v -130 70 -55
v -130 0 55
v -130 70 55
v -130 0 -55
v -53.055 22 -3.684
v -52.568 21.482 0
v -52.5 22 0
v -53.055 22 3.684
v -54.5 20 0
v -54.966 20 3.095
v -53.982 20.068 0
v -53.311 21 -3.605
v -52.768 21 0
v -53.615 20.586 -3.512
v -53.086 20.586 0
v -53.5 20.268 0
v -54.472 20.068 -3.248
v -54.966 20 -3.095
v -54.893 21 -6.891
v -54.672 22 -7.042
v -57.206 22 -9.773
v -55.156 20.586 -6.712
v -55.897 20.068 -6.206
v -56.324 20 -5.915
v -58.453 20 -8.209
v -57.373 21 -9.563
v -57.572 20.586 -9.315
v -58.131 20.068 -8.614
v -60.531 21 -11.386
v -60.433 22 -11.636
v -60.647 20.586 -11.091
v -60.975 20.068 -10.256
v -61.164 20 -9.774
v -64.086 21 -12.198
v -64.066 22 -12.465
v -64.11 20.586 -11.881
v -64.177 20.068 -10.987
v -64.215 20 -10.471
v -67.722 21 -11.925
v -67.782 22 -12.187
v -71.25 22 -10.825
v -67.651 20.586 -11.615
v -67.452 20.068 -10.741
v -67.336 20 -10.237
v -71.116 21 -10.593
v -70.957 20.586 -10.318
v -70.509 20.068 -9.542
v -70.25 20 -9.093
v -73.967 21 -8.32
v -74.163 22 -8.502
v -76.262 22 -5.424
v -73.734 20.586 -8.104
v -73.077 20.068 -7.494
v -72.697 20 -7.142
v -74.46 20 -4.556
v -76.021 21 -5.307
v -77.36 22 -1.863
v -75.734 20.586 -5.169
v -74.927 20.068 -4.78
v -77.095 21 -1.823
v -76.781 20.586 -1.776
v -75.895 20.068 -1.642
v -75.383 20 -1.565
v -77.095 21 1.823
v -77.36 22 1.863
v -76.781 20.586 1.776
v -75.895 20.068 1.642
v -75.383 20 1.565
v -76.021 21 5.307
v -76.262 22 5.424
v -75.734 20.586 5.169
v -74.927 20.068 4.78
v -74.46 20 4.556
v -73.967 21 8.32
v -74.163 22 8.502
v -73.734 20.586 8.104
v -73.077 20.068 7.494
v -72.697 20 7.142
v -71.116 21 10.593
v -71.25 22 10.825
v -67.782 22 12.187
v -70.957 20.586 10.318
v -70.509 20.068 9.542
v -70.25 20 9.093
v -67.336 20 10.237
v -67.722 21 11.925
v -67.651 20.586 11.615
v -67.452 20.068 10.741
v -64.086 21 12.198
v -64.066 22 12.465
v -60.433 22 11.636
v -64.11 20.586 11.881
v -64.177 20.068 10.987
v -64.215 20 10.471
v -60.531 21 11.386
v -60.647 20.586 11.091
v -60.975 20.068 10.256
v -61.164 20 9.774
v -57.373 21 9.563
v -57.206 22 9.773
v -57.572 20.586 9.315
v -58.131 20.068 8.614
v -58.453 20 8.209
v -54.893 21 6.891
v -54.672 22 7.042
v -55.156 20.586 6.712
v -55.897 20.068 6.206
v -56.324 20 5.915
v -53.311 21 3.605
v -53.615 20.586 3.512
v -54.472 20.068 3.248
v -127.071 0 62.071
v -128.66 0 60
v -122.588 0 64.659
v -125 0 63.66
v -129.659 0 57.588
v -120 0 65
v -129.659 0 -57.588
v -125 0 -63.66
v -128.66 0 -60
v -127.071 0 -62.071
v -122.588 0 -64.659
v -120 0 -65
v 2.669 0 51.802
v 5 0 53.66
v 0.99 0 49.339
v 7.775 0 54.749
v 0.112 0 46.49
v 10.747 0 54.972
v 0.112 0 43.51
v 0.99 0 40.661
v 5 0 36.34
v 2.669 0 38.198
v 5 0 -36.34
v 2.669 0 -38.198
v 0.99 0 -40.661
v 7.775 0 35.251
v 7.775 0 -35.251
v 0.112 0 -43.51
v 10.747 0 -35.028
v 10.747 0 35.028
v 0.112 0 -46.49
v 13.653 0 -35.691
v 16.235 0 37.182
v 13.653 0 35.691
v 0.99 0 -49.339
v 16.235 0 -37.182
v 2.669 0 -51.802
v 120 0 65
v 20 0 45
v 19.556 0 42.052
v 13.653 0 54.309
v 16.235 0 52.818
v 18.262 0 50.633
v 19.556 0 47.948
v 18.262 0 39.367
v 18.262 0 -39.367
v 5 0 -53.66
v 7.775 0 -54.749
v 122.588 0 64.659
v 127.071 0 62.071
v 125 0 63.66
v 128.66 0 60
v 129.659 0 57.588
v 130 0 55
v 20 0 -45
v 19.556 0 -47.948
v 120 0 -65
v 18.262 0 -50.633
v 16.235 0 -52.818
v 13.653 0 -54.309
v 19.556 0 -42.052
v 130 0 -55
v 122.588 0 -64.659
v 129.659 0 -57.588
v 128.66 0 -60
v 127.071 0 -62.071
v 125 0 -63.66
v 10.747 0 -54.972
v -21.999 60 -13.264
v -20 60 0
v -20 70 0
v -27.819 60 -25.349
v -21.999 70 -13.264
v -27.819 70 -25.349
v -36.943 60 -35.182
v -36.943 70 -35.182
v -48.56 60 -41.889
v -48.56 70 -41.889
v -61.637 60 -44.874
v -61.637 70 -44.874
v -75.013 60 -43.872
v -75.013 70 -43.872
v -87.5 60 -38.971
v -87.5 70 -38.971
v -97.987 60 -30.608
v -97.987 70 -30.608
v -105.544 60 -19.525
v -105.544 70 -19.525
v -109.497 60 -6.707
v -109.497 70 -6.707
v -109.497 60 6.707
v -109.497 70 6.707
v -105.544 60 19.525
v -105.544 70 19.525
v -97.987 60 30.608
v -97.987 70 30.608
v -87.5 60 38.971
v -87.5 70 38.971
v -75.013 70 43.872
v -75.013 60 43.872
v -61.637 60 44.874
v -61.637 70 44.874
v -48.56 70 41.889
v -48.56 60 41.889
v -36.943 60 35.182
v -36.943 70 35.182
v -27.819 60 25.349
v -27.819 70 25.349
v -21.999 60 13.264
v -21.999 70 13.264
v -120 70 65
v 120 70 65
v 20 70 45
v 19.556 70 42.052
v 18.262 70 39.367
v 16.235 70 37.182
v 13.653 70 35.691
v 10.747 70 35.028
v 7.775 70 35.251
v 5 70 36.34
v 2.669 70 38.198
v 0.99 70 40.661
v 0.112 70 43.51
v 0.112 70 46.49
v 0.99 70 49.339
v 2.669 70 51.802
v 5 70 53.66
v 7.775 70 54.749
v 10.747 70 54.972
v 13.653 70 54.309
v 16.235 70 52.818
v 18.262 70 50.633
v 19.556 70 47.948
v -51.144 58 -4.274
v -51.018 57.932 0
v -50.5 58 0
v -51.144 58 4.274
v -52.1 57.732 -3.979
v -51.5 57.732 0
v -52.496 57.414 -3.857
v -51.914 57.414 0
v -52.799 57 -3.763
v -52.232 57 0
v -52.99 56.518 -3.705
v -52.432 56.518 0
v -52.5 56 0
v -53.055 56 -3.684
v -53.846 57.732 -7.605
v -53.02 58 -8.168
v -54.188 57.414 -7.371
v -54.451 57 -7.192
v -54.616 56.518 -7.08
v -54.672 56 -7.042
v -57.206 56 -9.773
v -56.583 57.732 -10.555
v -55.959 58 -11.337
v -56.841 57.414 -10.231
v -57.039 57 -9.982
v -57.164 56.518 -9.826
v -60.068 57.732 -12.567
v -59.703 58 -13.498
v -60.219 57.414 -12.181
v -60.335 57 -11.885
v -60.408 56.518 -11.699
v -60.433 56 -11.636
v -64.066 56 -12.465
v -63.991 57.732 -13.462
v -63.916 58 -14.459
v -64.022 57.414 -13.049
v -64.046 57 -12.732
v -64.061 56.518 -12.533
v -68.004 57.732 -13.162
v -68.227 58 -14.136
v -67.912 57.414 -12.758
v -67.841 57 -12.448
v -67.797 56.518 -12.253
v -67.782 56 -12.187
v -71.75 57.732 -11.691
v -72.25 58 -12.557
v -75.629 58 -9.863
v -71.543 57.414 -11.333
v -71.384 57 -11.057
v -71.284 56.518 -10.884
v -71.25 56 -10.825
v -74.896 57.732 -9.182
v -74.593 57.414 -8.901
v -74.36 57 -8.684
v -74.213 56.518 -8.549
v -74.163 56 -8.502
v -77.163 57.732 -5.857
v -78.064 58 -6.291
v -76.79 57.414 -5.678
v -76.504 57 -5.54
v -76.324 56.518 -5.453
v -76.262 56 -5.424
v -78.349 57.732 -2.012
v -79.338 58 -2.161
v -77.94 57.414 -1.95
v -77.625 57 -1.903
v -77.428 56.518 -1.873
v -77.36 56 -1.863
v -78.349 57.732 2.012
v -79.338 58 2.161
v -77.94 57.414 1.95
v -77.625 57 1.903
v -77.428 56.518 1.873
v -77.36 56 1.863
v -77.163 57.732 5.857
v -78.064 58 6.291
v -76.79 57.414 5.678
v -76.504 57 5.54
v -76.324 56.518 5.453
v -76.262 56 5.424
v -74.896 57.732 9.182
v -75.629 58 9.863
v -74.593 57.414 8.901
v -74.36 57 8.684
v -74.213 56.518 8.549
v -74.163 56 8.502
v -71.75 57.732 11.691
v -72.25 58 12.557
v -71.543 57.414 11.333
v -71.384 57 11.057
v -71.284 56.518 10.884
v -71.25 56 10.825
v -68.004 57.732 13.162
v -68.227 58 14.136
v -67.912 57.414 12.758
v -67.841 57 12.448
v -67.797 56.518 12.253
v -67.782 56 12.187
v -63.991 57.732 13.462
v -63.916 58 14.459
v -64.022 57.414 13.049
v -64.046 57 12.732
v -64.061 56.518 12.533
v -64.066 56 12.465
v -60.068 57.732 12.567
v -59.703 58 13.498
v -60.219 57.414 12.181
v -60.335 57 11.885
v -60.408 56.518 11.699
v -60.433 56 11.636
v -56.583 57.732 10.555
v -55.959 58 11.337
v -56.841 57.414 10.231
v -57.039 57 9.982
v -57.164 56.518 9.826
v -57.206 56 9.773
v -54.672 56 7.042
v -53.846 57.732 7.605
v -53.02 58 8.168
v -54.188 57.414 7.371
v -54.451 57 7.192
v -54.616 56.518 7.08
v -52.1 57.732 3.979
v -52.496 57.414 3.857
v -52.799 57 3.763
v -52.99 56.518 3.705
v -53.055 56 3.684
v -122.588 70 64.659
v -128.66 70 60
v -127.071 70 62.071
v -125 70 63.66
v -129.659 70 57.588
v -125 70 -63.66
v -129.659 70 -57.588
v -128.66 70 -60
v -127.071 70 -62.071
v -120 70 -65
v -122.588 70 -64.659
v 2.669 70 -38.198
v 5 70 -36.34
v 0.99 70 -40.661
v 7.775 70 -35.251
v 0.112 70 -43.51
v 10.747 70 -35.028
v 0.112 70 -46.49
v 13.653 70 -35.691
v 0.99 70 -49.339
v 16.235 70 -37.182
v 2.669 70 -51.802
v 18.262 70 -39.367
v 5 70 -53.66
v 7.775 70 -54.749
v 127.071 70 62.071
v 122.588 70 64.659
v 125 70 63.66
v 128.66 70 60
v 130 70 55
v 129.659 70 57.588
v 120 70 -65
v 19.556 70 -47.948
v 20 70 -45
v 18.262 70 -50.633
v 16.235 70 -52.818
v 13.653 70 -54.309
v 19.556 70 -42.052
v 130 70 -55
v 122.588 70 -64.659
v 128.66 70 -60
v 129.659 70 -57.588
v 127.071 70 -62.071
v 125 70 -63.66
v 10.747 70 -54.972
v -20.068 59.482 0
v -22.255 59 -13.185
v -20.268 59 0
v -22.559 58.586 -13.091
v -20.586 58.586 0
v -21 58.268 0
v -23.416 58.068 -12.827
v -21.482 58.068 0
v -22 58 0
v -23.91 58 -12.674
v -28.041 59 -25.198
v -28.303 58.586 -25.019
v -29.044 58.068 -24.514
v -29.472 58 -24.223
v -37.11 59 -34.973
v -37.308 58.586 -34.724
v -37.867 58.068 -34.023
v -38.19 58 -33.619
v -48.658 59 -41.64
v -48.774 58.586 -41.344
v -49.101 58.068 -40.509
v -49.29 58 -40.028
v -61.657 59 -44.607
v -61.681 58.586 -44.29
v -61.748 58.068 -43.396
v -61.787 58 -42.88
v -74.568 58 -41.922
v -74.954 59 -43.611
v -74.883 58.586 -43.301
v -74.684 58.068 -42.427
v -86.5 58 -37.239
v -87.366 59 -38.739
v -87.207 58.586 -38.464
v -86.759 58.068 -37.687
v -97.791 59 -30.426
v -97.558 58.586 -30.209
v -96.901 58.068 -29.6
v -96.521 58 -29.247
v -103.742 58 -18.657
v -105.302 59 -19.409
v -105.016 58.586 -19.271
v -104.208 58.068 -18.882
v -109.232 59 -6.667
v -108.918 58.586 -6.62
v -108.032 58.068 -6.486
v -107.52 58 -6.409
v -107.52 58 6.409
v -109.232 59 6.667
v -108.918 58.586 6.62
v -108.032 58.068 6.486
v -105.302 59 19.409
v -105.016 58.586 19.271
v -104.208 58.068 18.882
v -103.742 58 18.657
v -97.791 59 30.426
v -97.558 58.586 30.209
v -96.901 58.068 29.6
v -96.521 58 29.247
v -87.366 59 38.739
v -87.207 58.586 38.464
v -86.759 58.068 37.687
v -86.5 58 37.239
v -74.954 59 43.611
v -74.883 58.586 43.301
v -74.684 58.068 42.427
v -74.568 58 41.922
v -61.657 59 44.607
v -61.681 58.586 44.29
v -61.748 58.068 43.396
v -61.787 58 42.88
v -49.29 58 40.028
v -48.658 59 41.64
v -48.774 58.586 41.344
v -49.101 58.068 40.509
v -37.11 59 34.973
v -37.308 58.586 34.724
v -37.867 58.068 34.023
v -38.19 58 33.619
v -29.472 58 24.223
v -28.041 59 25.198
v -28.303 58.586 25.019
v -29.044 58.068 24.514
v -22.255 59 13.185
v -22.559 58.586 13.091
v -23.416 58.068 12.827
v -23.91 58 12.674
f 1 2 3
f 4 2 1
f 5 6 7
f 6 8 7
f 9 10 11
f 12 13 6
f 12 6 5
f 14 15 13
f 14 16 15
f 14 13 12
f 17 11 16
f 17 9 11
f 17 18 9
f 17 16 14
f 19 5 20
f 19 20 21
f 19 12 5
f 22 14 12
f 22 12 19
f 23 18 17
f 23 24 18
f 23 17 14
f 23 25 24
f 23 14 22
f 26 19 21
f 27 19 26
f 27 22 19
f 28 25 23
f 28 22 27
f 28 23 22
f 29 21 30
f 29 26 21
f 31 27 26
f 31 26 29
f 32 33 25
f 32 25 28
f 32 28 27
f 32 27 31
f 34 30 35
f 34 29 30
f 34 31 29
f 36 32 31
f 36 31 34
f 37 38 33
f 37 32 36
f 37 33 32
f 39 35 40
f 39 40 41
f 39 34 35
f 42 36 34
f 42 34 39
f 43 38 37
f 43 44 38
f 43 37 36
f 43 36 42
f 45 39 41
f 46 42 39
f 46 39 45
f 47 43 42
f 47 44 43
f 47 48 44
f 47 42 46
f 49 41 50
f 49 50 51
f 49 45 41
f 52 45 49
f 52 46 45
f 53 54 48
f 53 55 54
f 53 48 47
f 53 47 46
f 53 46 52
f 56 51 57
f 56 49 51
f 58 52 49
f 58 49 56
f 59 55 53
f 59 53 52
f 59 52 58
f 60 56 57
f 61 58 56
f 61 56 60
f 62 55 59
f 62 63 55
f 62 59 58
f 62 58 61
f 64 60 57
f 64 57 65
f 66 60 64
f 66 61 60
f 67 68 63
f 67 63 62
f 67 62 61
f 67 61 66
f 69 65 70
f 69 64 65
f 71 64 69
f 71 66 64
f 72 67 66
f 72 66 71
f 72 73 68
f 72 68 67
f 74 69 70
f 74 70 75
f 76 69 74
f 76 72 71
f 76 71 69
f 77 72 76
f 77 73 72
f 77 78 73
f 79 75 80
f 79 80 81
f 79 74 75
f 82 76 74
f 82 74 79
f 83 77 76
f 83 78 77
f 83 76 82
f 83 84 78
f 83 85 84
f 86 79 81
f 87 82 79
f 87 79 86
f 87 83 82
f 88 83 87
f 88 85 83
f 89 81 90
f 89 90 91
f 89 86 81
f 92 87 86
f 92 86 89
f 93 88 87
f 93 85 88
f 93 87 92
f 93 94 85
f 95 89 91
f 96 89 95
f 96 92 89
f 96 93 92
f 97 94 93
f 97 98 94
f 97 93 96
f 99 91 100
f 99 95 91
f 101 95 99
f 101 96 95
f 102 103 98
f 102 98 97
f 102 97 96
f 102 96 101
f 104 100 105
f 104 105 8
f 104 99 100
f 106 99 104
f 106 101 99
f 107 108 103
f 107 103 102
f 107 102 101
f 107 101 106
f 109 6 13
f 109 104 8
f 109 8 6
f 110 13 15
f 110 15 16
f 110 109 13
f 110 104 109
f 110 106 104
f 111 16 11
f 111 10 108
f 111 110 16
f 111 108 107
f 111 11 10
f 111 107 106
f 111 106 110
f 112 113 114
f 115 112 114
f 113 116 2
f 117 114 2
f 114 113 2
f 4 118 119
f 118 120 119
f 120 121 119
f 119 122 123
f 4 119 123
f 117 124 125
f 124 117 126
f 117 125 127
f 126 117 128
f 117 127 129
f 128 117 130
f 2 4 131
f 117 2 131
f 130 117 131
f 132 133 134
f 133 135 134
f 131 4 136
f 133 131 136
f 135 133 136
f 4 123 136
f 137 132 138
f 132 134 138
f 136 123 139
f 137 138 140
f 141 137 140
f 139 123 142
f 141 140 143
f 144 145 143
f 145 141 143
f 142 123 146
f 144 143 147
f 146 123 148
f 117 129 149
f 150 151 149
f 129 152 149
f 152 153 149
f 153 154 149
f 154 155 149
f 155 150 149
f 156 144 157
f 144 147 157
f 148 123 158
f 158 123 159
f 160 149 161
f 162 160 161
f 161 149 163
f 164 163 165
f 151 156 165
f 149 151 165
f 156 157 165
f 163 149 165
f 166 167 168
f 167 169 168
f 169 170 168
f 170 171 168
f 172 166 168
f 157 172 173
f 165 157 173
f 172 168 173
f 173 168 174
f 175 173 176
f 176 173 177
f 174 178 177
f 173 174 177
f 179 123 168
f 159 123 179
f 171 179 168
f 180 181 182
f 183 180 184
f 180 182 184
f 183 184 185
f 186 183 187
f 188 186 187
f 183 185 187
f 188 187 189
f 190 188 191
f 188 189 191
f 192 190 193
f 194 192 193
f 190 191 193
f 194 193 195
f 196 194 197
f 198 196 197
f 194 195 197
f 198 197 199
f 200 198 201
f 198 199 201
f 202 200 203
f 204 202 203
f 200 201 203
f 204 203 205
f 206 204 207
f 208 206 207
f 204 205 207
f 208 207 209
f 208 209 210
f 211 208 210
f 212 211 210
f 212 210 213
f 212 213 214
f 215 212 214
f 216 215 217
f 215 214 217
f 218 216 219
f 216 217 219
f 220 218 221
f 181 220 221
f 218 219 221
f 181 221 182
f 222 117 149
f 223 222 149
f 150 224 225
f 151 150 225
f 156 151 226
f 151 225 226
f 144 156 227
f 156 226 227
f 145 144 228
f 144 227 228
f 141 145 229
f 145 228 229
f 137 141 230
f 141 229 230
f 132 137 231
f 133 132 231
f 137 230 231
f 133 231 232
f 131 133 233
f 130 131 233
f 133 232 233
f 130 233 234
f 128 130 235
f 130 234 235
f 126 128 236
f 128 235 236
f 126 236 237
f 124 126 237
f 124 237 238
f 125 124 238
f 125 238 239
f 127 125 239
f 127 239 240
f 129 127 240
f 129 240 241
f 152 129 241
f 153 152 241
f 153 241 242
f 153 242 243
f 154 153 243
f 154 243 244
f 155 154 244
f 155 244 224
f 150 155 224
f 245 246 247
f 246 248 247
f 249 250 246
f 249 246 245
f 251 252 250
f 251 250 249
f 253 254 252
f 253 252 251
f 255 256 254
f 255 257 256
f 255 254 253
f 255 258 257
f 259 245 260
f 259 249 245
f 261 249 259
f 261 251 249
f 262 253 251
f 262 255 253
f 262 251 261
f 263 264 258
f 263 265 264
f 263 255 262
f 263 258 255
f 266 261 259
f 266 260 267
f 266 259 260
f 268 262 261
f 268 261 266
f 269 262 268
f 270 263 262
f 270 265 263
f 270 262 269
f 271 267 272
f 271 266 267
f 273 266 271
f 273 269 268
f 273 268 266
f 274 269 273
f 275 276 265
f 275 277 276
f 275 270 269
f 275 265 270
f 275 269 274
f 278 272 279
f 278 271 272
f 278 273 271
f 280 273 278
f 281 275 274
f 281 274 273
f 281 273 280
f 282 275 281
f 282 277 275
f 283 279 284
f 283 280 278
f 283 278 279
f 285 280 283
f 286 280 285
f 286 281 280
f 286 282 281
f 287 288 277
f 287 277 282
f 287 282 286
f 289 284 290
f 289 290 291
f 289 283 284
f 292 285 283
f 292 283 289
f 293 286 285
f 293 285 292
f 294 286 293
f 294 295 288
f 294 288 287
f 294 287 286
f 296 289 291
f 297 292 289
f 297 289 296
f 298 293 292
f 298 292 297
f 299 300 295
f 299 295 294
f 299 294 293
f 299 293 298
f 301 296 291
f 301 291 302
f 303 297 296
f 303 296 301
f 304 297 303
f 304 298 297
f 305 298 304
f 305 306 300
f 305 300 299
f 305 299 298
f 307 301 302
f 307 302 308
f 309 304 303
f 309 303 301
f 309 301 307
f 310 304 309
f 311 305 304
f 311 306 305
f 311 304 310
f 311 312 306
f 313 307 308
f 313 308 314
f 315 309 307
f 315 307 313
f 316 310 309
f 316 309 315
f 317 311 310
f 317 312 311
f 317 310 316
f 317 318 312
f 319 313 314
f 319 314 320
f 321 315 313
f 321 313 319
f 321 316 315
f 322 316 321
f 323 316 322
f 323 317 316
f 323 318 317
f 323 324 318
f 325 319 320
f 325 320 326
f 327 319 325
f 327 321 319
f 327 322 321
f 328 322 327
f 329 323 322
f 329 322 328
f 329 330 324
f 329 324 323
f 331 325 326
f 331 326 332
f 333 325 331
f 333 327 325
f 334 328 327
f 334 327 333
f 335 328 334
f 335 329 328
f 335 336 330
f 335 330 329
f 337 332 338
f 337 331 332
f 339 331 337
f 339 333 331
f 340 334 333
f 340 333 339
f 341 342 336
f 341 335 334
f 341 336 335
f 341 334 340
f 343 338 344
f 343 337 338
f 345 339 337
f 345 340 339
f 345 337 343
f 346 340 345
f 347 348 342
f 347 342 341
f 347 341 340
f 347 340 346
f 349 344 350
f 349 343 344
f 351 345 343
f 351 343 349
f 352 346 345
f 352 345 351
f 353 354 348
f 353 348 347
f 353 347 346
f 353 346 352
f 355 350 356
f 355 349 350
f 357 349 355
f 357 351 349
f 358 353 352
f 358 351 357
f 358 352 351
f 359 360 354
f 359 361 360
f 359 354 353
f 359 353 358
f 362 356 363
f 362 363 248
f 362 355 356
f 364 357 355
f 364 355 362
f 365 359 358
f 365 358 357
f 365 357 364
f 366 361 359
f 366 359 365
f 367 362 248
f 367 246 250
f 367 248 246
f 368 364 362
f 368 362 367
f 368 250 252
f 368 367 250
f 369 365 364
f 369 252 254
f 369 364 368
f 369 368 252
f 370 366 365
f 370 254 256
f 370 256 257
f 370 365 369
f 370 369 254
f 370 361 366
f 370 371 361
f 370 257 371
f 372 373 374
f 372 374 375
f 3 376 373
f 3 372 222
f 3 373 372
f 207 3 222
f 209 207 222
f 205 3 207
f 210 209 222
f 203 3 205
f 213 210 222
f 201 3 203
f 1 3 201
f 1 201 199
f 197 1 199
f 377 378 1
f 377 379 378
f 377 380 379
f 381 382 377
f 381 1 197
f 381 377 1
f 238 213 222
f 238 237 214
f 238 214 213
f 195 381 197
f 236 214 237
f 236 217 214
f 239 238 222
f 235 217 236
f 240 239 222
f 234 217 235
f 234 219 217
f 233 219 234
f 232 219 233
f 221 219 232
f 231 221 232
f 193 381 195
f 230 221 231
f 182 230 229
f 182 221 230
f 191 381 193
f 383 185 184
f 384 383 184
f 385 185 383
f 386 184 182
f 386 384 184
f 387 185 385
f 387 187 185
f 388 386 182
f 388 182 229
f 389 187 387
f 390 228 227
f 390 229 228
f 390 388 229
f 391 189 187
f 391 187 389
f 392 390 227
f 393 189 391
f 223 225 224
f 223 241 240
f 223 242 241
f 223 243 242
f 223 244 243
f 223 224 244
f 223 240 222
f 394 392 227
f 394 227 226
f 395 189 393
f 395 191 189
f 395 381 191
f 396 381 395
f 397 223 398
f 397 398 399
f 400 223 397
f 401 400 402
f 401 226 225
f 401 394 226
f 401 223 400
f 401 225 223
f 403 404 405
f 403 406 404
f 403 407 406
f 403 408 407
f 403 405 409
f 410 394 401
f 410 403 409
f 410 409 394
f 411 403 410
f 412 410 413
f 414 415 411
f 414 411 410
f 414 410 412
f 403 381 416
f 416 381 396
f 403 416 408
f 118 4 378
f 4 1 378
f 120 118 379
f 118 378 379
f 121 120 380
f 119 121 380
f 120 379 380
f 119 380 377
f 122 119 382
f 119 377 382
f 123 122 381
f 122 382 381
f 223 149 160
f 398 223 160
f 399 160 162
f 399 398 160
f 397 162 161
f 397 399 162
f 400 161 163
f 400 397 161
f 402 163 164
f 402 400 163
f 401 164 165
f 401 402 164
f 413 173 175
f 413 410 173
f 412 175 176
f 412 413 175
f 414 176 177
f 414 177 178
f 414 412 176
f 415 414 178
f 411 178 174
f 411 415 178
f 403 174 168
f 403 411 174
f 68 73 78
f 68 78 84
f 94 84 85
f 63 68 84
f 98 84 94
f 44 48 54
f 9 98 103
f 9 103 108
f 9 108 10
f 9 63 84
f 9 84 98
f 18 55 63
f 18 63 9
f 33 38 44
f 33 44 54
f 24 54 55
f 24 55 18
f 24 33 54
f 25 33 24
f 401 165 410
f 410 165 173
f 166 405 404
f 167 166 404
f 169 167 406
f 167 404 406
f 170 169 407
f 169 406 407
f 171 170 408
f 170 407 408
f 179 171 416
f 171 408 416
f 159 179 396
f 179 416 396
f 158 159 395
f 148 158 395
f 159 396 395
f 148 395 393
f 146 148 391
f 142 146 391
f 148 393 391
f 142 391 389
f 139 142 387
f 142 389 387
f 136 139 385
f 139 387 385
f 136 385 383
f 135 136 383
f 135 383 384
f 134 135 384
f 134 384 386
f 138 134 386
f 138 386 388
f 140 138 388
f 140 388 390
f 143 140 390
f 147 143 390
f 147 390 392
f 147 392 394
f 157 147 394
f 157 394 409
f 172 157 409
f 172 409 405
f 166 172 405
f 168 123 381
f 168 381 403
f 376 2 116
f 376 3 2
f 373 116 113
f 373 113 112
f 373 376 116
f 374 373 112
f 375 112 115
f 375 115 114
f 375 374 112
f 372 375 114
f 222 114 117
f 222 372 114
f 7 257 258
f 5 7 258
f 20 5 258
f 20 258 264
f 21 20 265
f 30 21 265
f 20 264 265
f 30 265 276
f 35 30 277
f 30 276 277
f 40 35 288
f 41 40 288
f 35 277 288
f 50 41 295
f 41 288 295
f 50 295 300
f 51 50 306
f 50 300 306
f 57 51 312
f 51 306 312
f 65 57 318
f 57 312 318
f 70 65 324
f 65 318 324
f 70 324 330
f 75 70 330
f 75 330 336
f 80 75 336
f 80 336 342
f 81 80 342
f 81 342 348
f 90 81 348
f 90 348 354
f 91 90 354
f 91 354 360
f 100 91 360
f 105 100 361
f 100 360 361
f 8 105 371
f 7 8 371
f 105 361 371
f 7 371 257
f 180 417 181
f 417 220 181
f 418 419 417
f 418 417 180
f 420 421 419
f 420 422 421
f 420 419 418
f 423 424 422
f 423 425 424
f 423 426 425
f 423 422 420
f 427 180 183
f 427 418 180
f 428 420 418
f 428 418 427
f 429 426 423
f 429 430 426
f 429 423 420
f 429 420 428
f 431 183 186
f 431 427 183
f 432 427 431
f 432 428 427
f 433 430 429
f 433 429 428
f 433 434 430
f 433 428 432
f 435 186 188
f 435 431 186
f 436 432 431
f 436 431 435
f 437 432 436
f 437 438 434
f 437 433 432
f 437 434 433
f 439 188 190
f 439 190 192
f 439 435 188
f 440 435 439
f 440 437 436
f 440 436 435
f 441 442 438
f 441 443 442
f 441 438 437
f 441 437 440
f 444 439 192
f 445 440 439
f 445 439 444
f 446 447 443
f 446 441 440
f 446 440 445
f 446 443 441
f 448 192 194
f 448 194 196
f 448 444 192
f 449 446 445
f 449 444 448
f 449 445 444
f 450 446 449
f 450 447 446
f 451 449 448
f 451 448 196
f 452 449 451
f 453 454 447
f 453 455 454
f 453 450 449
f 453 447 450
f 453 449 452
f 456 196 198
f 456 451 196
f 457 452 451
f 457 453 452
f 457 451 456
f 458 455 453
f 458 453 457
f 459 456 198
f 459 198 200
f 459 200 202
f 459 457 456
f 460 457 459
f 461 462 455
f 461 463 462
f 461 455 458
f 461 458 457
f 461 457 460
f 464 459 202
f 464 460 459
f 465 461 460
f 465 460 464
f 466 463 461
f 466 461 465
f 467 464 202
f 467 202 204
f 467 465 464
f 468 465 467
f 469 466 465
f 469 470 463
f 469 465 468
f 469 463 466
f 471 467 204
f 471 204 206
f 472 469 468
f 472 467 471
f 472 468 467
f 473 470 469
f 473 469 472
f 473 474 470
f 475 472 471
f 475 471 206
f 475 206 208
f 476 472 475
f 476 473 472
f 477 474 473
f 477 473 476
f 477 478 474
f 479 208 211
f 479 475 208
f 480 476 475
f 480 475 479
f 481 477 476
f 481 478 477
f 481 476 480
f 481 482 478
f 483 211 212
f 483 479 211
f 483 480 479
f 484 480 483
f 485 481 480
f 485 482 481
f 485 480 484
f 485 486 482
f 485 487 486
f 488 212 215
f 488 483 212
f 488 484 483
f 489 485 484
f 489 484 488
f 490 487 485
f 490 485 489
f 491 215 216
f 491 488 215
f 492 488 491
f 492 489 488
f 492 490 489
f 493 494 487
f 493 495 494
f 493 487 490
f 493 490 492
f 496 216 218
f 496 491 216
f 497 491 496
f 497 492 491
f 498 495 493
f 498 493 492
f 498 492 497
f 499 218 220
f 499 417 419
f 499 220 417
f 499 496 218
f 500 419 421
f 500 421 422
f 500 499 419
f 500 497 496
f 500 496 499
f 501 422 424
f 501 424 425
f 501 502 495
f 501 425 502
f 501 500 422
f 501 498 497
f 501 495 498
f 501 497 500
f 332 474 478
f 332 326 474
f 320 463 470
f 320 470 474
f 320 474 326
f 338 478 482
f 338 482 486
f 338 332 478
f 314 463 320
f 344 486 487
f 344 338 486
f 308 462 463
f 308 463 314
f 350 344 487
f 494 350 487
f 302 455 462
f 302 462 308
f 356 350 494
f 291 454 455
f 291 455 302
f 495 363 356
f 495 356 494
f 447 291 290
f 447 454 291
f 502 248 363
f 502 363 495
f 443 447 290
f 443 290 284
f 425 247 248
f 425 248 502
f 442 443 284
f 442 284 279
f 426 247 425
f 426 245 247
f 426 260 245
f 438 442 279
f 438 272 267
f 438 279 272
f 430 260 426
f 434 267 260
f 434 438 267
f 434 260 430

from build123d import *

# Parameters (mm, degrees)
ESQUISSE2_W             = 260
ESQUISSE2_H             = 130
BOSS_EXTRU_2_DEPTH      = 70
ESQUISSE3_R             = 45
ENL_V_MAT_EXTRU_1_DEPTH = 12
CONG_1_R                = 2
ESQUISSE4_R             = 12.5
ENL_V_MAT_EXTRU_2_DEPTH = 38
CONG_2_R                = 2
CONG_3_R                = 2
CONG_4_R                = 10
CONG_5_R                = 10
CONG_6_R                = 10
CONG_7_R                = 10
ESQUISSE6_R             = 10
ENL_V_MAT_EXTRU_3_DEPTH = 71


with BuildPart() as part:
    # Esquisse2 → Boss.-Extru.2 (new body)
    with BuildSketch(Plane(origin=(0, 0, 0), x_dir=(1, 0, 0), z_dir=(0, 1, 0))):
        Rectangle(ESQUISSE2_W, ESQUISSE2_H)
    extrude(amount=BOSS_EXTRU_2_DEPTH)

    # Esquisse3 → Enlèv. mat.-Extru.1 (cut)
    with BuildSketch(Plane(origin=(0, 70, 0), x_dir=(1, 0, 0), z_dir=(0, 1, 0))):
        with Locations((-65, 0)):
            Circle(ESQUISSE3_R)
    extrude(amount=-ENL_V_MAT_EXTRU_1_DEPTH, mode=Mode.SUBTRACT)

    # Congé1
    cong_1_edges = [part.edges().sort_by_distance(p)[0] for p in [
        (-110, 58, 0),
    ]]
    fillet(cong_1_edges, radius=CONG_1_R)

    # Esquisse4 → Enlèv. mat.-Extru.2 (cut)
    with BuildSketch(Plane(origin=(0, 58, 0), x_dir=(1, 0, 0), z_dir=(0, 1, 0))):
        with Locations((-65, 0)):
            Circle(ESQUISSE4_R)
    extrude(amount=-ENL_V_MAT_EXTRU_2_DEPTH, mode=Mode.SUBTRACT)

    # Congé2
    cong_2_edges = [part.edges().sort_by_distance(p)[0] for p in [
        (-77.5, 58, 0),
    ]]
    fillet(cong_2_edges, radius=CONG_2_R)

    # Congé3
    cong_3_edges = [part.edges().sort_by_distance(p)[0] for p in [
        (-77.5, 20, 0),
    ]]
    fillet(cong_3_edges, radius=CONG_3_R)

    # Congé4
    cong_4_edges = [part.edges().sort_by_distance(p)[0] for p in [
        (-130, 35, -65),
    ]]
    fillet(cong_4_edges, radius=CONG_4_R)

    # Congé5
    cong_5_edges = [part.edges().sort_by_distance(p)[0] for p in [
        (-130, 35, 65),
    ]]
    fillet(cong_5_edges, radius=CONG_5_R)

    # Congé6
    cong_6_edges = [part.edges().sort_by_distance(p)[0] for p in [
        (130, 35, 65),
    ]]
    fillet(cong_6_edges, radius=CONG_6_R)

    # Congé7
    cong_7_edges = [part.edges().sort_by_distance(p)[0] for p in [
        (130, 35, -65),
    ]]
    fillet(cong_7_edges, radius=CONG_7_R)

    # Esquisse6 → Enlèv. mat.-Extru.3 (cut, through all)
    with BuildSketch(Plane(origin=(0, 70, 0), x_dir=(1, 0, 0), z_dir=(0, 1, 0))):
        with Locations((10, 45)):
            Circle(ESQUISSE6_R)
        with Locations((10, -45)):
            Circle(ESQUISSE6_R)
    extrude(amount=-ENL_V_MAT_EXTRU_3_DEPTH, mode=Mode.SUBTRACT)


solid = part.part
